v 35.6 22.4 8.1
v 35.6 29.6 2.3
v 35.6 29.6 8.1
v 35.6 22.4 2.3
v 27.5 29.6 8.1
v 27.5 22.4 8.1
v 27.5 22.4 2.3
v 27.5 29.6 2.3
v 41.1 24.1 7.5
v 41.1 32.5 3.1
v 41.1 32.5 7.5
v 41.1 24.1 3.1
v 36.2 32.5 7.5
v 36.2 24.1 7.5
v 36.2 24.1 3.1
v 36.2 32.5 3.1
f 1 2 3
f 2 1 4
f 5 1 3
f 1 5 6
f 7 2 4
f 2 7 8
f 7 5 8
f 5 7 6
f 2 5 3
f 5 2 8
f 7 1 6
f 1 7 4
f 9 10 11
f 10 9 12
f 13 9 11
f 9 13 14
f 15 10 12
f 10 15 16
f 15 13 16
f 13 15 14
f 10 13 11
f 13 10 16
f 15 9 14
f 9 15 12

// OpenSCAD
union() {
  translate([27.5, 22.4, 2.3]) cube(size=[8.1,7.2,5.8], center=false);
  translate([36.2, 24.1, 3.1]) cube(size=[4.9,8.4,4.4], center=false);
}
